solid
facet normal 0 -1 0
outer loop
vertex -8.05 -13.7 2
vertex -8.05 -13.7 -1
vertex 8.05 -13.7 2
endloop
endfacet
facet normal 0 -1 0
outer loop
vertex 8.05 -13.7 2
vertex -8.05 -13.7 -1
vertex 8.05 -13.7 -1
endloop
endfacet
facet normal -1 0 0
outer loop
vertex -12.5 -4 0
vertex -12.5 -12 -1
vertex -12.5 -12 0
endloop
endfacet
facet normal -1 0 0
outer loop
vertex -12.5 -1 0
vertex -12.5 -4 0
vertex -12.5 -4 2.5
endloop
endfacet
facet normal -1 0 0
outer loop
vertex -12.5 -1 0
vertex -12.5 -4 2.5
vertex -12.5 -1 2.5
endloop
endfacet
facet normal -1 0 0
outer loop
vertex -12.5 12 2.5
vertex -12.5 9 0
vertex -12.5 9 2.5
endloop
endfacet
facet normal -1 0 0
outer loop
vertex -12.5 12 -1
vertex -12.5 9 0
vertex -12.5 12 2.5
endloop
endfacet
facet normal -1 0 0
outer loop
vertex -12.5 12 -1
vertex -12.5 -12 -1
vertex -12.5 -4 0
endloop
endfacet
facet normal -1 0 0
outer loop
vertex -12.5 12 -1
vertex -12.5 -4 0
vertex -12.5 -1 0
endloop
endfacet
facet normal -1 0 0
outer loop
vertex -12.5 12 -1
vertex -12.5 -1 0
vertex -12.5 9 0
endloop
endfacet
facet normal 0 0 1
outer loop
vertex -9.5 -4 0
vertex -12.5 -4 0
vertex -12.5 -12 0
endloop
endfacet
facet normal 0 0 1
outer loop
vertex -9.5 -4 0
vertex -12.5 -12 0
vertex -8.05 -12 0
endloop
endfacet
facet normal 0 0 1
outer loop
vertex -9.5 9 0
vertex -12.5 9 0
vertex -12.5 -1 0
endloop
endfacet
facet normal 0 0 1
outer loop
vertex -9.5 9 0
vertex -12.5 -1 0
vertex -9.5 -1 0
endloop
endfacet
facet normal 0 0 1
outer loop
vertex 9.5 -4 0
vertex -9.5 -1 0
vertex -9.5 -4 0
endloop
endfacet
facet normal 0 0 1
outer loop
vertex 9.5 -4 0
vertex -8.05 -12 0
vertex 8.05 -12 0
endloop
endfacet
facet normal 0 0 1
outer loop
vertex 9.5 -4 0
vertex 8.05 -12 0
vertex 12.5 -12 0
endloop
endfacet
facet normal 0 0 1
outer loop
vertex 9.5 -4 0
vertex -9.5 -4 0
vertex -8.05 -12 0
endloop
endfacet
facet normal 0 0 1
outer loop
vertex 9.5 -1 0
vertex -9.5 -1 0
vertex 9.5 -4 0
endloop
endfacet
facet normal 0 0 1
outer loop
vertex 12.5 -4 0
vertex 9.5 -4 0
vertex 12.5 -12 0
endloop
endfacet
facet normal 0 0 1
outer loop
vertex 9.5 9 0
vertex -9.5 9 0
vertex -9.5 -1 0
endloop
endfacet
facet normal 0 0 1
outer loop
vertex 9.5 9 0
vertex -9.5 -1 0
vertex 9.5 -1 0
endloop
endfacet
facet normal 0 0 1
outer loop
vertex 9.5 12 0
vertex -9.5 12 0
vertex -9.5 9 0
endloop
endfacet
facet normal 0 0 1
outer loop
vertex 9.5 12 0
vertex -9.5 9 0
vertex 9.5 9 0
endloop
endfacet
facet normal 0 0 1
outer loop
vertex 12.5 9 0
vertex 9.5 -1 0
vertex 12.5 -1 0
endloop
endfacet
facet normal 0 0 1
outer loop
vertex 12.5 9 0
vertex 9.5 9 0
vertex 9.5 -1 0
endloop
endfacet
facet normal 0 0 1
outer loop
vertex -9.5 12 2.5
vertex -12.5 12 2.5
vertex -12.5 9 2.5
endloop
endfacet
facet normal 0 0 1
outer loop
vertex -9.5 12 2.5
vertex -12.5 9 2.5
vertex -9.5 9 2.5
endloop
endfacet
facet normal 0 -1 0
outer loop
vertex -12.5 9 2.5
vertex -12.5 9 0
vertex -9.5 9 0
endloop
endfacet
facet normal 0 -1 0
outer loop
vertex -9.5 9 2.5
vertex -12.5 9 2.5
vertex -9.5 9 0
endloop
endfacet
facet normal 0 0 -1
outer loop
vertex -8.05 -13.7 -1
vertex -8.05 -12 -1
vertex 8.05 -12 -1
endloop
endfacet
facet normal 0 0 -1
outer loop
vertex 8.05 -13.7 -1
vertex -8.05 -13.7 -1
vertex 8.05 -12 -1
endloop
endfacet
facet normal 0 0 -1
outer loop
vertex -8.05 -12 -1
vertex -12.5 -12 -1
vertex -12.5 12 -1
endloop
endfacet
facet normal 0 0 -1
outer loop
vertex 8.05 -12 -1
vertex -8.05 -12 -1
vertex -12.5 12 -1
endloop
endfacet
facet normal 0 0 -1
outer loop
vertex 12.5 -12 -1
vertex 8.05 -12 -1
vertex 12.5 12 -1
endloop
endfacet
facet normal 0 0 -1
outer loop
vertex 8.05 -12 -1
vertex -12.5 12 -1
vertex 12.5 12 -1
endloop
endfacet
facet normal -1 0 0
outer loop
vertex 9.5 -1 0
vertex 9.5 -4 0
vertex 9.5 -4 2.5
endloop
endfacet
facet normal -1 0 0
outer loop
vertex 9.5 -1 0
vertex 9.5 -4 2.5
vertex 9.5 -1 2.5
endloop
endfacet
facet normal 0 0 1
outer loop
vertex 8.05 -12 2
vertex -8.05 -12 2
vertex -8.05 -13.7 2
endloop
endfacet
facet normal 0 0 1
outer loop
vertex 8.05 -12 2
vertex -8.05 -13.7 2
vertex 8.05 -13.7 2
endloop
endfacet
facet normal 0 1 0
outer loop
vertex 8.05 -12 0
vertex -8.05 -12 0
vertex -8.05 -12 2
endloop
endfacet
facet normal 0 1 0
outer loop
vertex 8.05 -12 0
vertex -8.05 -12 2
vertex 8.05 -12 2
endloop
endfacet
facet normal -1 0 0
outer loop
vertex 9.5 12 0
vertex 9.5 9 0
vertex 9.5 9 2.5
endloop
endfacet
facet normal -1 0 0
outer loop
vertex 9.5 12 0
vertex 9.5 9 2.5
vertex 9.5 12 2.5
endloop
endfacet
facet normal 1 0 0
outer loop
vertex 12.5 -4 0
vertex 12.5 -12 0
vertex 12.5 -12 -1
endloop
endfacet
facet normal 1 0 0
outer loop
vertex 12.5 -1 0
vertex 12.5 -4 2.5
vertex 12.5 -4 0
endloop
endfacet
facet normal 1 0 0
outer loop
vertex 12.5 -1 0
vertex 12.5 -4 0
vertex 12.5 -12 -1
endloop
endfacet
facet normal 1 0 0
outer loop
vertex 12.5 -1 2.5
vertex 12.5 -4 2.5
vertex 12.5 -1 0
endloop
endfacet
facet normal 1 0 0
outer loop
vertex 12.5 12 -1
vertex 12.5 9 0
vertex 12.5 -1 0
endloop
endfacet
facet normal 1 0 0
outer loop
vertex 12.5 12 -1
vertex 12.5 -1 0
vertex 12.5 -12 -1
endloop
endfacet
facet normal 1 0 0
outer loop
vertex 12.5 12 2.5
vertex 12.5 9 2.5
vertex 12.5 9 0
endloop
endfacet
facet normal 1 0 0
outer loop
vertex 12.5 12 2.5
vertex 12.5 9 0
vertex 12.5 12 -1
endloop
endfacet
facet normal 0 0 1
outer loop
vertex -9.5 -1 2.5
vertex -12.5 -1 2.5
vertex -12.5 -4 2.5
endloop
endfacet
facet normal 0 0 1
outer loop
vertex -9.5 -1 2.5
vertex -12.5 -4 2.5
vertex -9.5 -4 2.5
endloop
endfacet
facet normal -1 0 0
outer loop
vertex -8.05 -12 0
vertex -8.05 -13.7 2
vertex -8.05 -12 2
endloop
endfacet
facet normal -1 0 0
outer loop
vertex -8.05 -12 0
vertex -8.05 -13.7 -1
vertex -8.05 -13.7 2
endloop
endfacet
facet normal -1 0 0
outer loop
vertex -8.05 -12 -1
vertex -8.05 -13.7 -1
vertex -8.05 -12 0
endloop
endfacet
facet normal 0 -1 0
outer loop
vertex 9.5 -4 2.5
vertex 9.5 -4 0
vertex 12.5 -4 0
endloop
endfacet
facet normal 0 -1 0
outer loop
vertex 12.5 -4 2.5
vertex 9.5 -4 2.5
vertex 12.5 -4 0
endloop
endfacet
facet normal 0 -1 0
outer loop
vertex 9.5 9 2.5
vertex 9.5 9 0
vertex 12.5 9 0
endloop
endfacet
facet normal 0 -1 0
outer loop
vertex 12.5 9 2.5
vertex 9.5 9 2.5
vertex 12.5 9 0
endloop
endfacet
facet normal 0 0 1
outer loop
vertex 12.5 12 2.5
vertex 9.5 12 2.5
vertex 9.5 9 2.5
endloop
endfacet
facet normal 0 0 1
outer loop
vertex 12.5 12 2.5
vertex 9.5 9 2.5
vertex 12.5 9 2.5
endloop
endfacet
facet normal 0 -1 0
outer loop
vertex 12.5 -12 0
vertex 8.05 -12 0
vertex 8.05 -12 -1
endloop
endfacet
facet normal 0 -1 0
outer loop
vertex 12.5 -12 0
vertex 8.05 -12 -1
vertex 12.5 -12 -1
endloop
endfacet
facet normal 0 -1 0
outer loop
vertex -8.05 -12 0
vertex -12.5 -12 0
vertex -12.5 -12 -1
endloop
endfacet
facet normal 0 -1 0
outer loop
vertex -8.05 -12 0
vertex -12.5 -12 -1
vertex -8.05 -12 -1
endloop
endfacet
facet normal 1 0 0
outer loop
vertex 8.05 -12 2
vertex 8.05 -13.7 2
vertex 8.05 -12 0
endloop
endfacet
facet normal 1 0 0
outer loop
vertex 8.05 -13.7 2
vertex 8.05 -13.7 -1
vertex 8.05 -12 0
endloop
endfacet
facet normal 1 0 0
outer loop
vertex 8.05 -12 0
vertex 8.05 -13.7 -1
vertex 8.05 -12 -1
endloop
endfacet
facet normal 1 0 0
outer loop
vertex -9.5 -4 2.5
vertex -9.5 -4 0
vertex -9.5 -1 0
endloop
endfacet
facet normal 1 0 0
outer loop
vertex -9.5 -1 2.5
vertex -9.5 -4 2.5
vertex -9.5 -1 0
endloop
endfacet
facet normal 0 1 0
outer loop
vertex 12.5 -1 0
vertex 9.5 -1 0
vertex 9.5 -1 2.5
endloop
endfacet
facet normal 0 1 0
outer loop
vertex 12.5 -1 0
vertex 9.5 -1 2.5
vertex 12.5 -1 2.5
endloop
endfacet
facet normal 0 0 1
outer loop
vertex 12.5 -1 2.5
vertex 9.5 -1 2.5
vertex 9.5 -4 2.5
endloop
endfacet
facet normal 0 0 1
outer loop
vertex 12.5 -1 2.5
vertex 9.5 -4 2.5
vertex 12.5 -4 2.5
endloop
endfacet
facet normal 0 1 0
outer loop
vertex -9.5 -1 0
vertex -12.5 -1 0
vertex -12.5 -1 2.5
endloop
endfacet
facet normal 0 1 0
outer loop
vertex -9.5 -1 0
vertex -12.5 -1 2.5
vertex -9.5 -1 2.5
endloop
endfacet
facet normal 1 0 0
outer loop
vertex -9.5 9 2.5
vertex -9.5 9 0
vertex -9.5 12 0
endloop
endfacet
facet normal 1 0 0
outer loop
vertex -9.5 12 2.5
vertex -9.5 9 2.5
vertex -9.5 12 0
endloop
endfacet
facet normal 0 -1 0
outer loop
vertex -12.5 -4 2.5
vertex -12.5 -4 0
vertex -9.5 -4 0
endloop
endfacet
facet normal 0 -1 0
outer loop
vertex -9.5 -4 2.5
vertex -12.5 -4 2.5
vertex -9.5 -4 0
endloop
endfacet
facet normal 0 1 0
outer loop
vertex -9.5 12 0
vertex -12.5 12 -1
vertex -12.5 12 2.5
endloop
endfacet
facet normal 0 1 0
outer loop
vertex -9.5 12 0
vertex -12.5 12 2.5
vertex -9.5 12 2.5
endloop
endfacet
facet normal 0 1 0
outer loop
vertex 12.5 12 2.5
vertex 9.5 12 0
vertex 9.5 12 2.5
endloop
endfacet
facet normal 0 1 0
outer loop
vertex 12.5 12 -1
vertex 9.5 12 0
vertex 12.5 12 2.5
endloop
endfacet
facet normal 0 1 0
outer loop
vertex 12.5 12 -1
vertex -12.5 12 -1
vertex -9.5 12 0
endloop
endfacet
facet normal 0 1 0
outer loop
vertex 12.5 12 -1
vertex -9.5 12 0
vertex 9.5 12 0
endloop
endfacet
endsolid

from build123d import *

# Parameters (mm, degrees)
F0_W     = 3
F0_H     = 3
F0_W_2   = 16.1
F0_H_2   = 1.7
F1_DEPTH = 1
F2_DEPTH = 2.5
F3_DEPTH = 2


with BuildPart() as f1:
    # F0 (on Top) → F1 (new body)
    with BuildSketch(Plane.XY):
        with Locations((-11, 10.5)):
            Rectangle(F0_W, F0_H)
        Polygon((9.5, 12), (-9.5, 12), (-9.5, 9), (-12.5, 9), (-12.5, -1), (-9.5, -1), (-9.5, -4), (-12.5, -4), (-12.5, -12), (-8.05, -12), (8.05, -12), (12.5, -12), (12.5, -4), (9.5, -4), (9.5, -1), (12.5, -1), (12.5, 9), (9.5, 9), align=None)
        with Locations((11, 10.5)):
            Rectangle(F0_W, F0_H)
        with Locations((11, -2.5)):
            Rectangle(F0_W, F0_H)
        with Locations((-11, -2.5)):
            Rectangle(F0_W, F0_H)
        with Locations((0, -12.85)):
            Rectangle(F0_W_2, F0_H_2)
    extrude(amount=-F1_DEPTH)

    # F0 (on Top) → F2 (join)
    with BuildSketch(Plane.XY):
        with Locations((-11, 10.5)):
            Rectangle(F0_W, F0_H)
        with Locations((11, 10.5)):
            Rectangle(F0_W, F0_H)
        with Locations((-11, -2.5)):
            Rectangle(F0_W, F0_H)
        with Locations((11, -2.5)):
            Rectangle(F0_W, F0_H)
    extrude(amount=F2_DEPTH)

    # F0 (on Top) → F3 (join)
    with BuildSketch(Plane.XY):
        with Locations((0, -12.85)):
            Rectangle(F0_W_2, F0_H_2)
    extrude(amount=F3_DEPTH)


solid = f1.part
